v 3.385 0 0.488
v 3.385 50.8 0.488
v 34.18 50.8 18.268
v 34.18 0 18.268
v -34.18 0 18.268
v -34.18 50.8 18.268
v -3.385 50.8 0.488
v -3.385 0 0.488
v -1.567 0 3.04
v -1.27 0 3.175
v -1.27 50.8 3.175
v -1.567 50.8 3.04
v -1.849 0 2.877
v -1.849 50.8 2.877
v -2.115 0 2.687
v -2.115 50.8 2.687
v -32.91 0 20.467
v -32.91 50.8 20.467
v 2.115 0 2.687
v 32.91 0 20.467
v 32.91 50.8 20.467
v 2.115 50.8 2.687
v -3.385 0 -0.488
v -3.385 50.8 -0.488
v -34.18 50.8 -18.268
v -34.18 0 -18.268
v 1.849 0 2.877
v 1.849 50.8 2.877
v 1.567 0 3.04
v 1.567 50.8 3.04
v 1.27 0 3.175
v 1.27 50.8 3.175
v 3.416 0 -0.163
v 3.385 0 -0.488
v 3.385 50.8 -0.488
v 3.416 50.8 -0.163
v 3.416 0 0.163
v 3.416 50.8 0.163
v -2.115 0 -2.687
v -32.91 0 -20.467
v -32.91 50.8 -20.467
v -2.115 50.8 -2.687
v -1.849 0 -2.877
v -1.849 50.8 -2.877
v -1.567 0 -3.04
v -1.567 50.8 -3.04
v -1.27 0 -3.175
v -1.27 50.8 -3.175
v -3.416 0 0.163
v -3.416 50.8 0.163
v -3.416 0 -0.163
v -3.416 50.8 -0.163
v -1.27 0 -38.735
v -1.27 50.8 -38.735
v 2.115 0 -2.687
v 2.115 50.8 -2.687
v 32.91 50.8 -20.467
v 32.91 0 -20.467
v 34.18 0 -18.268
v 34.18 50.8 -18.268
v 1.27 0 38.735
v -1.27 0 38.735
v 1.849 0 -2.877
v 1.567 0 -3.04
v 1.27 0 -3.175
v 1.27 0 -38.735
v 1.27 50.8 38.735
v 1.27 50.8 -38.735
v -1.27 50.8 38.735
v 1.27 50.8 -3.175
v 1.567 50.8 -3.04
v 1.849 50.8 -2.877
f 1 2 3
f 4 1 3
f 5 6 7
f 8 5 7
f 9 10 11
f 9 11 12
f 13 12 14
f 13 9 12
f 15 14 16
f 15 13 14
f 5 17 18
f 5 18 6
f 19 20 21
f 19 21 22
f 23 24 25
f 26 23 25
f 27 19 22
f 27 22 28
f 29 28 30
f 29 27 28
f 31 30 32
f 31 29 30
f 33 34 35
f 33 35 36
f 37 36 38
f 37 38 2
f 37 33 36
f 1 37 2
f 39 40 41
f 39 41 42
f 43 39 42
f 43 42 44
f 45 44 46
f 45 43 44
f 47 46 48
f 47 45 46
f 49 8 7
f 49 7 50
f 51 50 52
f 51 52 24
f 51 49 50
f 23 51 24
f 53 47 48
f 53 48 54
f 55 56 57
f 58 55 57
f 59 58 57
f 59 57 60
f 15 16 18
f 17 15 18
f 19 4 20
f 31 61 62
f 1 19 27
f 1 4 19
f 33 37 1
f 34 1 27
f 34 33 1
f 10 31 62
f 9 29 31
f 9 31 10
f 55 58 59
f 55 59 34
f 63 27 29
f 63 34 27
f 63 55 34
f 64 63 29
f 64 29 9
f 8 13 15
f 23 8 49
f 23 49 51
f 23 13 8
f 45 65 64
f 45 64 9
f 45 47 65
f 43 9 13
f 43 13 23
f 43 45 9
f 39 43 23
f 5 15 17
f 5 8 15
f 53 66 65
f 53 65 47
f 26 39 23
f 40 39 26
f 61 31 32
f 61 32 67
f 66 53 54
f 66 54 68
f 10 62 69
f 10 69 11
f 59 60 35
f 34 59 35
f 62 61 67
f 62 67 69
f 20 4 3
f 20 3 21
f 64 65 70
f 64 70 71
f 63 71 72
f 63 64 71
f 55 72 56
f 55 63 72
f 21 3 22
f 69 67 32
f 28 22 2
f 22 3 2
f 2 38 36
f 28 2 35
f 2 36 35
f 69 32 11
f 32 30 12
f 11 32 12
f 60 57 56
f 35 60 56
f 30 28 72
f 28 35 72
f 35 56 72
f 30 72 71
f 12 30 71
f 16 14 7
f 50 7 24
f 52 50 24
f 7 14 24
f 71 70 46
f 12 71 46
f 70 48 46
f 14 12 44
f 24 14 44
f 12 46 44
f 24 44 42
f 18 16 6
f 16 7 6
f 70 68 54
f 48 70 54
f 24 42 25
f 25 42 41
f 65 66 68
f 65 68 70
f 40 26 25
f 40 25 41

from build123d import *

# Parameters (mm, degrees)
BOSS_EXTRUDE1_DEPTH = 50.8


with BuildPart() as part:
    # Sketch1 → Boss-Extrude1 (new body)
    with BuildSketch(Plane(origin=(0, 0, 0), x_dir=(1, 0, 0), z_dir=(0, 1, 0))):
        with BuildLine():
            Line((-1.27, 3.175), (-1.27, 38.735))
            Line((-1.27, 38.735), (1.27, 38.735))
            Line((1.27, 38.735), (1.27, 3.175))
            ThreePointArc((1.27, 3.175), (1.709789826, 2.961442849), (2.114630657, 2.687352263))
            Line((2.114630657, 2.687352263), (32.910494016, 20.467352263))
            Line((32.910494016, 20.467352263), (34.180494016, 18.267647737))
            Line((34.180494016, 18.267647737), (3.384630657, 0.487647737))
            ThreePointArc((3.384630657, 0.487647737), (3.419579653, 0), (3.384630657, -0.487647737))
            Line((3.384630657, -0.487647737), (34.180494016, -18.267647737))
            Line((34.180494016, -18.267647737), (32.910494016, -20.467352263))
            Line((32.910494016, -20.467352263), (2.114630657, -2.687352263))
            ThreePointArc((2.114630657, -2.687352263), (1.709789826, -2.961442849), (1.27, -3.175))
            Line((1.27, -3.175), (1.27, -38.735))
            Line((1.27, -38.735), (-1.27, -38.735))
            Line((-1.27, -38.735), (-1.27, -3.175))
            ThreePointArc((-1.27, -3.175), (-1.709789826, -2.961442849), (-2.114630657, -2.687352263))
            Line((-2.114630657, -2.687352263), (-32.910494016, -20.467352263))
            Line((-32.910494016, -20.467352263), (-34.180494016, -18.267647737))
            Line((-34.180494016, -18.267647737), (-3.384630657, -0.487647737))
            ThreePointArc((-3.384630657, -0.487647737), (-3.419579653, 0), (-3.384630657, 0.487647737))
            Line((-3.384630657, 0.487647737), (-34.180494016, 18.267647737))
            Line((-34.180494016, 18.267647737), (-32.910494016, 20.467352263))
            Line((-32.910494016, 20.467352263), (-2.114630657, 2.687352263))
            ThreePointArc((-2.114630657, 2.687352263), (-1.709789826, 2.961442849), (-1.27, 3.175))
        make_face()
    extrude(amount=BOSS_EXTRUDE1_DEPTH)


solid = part.part
